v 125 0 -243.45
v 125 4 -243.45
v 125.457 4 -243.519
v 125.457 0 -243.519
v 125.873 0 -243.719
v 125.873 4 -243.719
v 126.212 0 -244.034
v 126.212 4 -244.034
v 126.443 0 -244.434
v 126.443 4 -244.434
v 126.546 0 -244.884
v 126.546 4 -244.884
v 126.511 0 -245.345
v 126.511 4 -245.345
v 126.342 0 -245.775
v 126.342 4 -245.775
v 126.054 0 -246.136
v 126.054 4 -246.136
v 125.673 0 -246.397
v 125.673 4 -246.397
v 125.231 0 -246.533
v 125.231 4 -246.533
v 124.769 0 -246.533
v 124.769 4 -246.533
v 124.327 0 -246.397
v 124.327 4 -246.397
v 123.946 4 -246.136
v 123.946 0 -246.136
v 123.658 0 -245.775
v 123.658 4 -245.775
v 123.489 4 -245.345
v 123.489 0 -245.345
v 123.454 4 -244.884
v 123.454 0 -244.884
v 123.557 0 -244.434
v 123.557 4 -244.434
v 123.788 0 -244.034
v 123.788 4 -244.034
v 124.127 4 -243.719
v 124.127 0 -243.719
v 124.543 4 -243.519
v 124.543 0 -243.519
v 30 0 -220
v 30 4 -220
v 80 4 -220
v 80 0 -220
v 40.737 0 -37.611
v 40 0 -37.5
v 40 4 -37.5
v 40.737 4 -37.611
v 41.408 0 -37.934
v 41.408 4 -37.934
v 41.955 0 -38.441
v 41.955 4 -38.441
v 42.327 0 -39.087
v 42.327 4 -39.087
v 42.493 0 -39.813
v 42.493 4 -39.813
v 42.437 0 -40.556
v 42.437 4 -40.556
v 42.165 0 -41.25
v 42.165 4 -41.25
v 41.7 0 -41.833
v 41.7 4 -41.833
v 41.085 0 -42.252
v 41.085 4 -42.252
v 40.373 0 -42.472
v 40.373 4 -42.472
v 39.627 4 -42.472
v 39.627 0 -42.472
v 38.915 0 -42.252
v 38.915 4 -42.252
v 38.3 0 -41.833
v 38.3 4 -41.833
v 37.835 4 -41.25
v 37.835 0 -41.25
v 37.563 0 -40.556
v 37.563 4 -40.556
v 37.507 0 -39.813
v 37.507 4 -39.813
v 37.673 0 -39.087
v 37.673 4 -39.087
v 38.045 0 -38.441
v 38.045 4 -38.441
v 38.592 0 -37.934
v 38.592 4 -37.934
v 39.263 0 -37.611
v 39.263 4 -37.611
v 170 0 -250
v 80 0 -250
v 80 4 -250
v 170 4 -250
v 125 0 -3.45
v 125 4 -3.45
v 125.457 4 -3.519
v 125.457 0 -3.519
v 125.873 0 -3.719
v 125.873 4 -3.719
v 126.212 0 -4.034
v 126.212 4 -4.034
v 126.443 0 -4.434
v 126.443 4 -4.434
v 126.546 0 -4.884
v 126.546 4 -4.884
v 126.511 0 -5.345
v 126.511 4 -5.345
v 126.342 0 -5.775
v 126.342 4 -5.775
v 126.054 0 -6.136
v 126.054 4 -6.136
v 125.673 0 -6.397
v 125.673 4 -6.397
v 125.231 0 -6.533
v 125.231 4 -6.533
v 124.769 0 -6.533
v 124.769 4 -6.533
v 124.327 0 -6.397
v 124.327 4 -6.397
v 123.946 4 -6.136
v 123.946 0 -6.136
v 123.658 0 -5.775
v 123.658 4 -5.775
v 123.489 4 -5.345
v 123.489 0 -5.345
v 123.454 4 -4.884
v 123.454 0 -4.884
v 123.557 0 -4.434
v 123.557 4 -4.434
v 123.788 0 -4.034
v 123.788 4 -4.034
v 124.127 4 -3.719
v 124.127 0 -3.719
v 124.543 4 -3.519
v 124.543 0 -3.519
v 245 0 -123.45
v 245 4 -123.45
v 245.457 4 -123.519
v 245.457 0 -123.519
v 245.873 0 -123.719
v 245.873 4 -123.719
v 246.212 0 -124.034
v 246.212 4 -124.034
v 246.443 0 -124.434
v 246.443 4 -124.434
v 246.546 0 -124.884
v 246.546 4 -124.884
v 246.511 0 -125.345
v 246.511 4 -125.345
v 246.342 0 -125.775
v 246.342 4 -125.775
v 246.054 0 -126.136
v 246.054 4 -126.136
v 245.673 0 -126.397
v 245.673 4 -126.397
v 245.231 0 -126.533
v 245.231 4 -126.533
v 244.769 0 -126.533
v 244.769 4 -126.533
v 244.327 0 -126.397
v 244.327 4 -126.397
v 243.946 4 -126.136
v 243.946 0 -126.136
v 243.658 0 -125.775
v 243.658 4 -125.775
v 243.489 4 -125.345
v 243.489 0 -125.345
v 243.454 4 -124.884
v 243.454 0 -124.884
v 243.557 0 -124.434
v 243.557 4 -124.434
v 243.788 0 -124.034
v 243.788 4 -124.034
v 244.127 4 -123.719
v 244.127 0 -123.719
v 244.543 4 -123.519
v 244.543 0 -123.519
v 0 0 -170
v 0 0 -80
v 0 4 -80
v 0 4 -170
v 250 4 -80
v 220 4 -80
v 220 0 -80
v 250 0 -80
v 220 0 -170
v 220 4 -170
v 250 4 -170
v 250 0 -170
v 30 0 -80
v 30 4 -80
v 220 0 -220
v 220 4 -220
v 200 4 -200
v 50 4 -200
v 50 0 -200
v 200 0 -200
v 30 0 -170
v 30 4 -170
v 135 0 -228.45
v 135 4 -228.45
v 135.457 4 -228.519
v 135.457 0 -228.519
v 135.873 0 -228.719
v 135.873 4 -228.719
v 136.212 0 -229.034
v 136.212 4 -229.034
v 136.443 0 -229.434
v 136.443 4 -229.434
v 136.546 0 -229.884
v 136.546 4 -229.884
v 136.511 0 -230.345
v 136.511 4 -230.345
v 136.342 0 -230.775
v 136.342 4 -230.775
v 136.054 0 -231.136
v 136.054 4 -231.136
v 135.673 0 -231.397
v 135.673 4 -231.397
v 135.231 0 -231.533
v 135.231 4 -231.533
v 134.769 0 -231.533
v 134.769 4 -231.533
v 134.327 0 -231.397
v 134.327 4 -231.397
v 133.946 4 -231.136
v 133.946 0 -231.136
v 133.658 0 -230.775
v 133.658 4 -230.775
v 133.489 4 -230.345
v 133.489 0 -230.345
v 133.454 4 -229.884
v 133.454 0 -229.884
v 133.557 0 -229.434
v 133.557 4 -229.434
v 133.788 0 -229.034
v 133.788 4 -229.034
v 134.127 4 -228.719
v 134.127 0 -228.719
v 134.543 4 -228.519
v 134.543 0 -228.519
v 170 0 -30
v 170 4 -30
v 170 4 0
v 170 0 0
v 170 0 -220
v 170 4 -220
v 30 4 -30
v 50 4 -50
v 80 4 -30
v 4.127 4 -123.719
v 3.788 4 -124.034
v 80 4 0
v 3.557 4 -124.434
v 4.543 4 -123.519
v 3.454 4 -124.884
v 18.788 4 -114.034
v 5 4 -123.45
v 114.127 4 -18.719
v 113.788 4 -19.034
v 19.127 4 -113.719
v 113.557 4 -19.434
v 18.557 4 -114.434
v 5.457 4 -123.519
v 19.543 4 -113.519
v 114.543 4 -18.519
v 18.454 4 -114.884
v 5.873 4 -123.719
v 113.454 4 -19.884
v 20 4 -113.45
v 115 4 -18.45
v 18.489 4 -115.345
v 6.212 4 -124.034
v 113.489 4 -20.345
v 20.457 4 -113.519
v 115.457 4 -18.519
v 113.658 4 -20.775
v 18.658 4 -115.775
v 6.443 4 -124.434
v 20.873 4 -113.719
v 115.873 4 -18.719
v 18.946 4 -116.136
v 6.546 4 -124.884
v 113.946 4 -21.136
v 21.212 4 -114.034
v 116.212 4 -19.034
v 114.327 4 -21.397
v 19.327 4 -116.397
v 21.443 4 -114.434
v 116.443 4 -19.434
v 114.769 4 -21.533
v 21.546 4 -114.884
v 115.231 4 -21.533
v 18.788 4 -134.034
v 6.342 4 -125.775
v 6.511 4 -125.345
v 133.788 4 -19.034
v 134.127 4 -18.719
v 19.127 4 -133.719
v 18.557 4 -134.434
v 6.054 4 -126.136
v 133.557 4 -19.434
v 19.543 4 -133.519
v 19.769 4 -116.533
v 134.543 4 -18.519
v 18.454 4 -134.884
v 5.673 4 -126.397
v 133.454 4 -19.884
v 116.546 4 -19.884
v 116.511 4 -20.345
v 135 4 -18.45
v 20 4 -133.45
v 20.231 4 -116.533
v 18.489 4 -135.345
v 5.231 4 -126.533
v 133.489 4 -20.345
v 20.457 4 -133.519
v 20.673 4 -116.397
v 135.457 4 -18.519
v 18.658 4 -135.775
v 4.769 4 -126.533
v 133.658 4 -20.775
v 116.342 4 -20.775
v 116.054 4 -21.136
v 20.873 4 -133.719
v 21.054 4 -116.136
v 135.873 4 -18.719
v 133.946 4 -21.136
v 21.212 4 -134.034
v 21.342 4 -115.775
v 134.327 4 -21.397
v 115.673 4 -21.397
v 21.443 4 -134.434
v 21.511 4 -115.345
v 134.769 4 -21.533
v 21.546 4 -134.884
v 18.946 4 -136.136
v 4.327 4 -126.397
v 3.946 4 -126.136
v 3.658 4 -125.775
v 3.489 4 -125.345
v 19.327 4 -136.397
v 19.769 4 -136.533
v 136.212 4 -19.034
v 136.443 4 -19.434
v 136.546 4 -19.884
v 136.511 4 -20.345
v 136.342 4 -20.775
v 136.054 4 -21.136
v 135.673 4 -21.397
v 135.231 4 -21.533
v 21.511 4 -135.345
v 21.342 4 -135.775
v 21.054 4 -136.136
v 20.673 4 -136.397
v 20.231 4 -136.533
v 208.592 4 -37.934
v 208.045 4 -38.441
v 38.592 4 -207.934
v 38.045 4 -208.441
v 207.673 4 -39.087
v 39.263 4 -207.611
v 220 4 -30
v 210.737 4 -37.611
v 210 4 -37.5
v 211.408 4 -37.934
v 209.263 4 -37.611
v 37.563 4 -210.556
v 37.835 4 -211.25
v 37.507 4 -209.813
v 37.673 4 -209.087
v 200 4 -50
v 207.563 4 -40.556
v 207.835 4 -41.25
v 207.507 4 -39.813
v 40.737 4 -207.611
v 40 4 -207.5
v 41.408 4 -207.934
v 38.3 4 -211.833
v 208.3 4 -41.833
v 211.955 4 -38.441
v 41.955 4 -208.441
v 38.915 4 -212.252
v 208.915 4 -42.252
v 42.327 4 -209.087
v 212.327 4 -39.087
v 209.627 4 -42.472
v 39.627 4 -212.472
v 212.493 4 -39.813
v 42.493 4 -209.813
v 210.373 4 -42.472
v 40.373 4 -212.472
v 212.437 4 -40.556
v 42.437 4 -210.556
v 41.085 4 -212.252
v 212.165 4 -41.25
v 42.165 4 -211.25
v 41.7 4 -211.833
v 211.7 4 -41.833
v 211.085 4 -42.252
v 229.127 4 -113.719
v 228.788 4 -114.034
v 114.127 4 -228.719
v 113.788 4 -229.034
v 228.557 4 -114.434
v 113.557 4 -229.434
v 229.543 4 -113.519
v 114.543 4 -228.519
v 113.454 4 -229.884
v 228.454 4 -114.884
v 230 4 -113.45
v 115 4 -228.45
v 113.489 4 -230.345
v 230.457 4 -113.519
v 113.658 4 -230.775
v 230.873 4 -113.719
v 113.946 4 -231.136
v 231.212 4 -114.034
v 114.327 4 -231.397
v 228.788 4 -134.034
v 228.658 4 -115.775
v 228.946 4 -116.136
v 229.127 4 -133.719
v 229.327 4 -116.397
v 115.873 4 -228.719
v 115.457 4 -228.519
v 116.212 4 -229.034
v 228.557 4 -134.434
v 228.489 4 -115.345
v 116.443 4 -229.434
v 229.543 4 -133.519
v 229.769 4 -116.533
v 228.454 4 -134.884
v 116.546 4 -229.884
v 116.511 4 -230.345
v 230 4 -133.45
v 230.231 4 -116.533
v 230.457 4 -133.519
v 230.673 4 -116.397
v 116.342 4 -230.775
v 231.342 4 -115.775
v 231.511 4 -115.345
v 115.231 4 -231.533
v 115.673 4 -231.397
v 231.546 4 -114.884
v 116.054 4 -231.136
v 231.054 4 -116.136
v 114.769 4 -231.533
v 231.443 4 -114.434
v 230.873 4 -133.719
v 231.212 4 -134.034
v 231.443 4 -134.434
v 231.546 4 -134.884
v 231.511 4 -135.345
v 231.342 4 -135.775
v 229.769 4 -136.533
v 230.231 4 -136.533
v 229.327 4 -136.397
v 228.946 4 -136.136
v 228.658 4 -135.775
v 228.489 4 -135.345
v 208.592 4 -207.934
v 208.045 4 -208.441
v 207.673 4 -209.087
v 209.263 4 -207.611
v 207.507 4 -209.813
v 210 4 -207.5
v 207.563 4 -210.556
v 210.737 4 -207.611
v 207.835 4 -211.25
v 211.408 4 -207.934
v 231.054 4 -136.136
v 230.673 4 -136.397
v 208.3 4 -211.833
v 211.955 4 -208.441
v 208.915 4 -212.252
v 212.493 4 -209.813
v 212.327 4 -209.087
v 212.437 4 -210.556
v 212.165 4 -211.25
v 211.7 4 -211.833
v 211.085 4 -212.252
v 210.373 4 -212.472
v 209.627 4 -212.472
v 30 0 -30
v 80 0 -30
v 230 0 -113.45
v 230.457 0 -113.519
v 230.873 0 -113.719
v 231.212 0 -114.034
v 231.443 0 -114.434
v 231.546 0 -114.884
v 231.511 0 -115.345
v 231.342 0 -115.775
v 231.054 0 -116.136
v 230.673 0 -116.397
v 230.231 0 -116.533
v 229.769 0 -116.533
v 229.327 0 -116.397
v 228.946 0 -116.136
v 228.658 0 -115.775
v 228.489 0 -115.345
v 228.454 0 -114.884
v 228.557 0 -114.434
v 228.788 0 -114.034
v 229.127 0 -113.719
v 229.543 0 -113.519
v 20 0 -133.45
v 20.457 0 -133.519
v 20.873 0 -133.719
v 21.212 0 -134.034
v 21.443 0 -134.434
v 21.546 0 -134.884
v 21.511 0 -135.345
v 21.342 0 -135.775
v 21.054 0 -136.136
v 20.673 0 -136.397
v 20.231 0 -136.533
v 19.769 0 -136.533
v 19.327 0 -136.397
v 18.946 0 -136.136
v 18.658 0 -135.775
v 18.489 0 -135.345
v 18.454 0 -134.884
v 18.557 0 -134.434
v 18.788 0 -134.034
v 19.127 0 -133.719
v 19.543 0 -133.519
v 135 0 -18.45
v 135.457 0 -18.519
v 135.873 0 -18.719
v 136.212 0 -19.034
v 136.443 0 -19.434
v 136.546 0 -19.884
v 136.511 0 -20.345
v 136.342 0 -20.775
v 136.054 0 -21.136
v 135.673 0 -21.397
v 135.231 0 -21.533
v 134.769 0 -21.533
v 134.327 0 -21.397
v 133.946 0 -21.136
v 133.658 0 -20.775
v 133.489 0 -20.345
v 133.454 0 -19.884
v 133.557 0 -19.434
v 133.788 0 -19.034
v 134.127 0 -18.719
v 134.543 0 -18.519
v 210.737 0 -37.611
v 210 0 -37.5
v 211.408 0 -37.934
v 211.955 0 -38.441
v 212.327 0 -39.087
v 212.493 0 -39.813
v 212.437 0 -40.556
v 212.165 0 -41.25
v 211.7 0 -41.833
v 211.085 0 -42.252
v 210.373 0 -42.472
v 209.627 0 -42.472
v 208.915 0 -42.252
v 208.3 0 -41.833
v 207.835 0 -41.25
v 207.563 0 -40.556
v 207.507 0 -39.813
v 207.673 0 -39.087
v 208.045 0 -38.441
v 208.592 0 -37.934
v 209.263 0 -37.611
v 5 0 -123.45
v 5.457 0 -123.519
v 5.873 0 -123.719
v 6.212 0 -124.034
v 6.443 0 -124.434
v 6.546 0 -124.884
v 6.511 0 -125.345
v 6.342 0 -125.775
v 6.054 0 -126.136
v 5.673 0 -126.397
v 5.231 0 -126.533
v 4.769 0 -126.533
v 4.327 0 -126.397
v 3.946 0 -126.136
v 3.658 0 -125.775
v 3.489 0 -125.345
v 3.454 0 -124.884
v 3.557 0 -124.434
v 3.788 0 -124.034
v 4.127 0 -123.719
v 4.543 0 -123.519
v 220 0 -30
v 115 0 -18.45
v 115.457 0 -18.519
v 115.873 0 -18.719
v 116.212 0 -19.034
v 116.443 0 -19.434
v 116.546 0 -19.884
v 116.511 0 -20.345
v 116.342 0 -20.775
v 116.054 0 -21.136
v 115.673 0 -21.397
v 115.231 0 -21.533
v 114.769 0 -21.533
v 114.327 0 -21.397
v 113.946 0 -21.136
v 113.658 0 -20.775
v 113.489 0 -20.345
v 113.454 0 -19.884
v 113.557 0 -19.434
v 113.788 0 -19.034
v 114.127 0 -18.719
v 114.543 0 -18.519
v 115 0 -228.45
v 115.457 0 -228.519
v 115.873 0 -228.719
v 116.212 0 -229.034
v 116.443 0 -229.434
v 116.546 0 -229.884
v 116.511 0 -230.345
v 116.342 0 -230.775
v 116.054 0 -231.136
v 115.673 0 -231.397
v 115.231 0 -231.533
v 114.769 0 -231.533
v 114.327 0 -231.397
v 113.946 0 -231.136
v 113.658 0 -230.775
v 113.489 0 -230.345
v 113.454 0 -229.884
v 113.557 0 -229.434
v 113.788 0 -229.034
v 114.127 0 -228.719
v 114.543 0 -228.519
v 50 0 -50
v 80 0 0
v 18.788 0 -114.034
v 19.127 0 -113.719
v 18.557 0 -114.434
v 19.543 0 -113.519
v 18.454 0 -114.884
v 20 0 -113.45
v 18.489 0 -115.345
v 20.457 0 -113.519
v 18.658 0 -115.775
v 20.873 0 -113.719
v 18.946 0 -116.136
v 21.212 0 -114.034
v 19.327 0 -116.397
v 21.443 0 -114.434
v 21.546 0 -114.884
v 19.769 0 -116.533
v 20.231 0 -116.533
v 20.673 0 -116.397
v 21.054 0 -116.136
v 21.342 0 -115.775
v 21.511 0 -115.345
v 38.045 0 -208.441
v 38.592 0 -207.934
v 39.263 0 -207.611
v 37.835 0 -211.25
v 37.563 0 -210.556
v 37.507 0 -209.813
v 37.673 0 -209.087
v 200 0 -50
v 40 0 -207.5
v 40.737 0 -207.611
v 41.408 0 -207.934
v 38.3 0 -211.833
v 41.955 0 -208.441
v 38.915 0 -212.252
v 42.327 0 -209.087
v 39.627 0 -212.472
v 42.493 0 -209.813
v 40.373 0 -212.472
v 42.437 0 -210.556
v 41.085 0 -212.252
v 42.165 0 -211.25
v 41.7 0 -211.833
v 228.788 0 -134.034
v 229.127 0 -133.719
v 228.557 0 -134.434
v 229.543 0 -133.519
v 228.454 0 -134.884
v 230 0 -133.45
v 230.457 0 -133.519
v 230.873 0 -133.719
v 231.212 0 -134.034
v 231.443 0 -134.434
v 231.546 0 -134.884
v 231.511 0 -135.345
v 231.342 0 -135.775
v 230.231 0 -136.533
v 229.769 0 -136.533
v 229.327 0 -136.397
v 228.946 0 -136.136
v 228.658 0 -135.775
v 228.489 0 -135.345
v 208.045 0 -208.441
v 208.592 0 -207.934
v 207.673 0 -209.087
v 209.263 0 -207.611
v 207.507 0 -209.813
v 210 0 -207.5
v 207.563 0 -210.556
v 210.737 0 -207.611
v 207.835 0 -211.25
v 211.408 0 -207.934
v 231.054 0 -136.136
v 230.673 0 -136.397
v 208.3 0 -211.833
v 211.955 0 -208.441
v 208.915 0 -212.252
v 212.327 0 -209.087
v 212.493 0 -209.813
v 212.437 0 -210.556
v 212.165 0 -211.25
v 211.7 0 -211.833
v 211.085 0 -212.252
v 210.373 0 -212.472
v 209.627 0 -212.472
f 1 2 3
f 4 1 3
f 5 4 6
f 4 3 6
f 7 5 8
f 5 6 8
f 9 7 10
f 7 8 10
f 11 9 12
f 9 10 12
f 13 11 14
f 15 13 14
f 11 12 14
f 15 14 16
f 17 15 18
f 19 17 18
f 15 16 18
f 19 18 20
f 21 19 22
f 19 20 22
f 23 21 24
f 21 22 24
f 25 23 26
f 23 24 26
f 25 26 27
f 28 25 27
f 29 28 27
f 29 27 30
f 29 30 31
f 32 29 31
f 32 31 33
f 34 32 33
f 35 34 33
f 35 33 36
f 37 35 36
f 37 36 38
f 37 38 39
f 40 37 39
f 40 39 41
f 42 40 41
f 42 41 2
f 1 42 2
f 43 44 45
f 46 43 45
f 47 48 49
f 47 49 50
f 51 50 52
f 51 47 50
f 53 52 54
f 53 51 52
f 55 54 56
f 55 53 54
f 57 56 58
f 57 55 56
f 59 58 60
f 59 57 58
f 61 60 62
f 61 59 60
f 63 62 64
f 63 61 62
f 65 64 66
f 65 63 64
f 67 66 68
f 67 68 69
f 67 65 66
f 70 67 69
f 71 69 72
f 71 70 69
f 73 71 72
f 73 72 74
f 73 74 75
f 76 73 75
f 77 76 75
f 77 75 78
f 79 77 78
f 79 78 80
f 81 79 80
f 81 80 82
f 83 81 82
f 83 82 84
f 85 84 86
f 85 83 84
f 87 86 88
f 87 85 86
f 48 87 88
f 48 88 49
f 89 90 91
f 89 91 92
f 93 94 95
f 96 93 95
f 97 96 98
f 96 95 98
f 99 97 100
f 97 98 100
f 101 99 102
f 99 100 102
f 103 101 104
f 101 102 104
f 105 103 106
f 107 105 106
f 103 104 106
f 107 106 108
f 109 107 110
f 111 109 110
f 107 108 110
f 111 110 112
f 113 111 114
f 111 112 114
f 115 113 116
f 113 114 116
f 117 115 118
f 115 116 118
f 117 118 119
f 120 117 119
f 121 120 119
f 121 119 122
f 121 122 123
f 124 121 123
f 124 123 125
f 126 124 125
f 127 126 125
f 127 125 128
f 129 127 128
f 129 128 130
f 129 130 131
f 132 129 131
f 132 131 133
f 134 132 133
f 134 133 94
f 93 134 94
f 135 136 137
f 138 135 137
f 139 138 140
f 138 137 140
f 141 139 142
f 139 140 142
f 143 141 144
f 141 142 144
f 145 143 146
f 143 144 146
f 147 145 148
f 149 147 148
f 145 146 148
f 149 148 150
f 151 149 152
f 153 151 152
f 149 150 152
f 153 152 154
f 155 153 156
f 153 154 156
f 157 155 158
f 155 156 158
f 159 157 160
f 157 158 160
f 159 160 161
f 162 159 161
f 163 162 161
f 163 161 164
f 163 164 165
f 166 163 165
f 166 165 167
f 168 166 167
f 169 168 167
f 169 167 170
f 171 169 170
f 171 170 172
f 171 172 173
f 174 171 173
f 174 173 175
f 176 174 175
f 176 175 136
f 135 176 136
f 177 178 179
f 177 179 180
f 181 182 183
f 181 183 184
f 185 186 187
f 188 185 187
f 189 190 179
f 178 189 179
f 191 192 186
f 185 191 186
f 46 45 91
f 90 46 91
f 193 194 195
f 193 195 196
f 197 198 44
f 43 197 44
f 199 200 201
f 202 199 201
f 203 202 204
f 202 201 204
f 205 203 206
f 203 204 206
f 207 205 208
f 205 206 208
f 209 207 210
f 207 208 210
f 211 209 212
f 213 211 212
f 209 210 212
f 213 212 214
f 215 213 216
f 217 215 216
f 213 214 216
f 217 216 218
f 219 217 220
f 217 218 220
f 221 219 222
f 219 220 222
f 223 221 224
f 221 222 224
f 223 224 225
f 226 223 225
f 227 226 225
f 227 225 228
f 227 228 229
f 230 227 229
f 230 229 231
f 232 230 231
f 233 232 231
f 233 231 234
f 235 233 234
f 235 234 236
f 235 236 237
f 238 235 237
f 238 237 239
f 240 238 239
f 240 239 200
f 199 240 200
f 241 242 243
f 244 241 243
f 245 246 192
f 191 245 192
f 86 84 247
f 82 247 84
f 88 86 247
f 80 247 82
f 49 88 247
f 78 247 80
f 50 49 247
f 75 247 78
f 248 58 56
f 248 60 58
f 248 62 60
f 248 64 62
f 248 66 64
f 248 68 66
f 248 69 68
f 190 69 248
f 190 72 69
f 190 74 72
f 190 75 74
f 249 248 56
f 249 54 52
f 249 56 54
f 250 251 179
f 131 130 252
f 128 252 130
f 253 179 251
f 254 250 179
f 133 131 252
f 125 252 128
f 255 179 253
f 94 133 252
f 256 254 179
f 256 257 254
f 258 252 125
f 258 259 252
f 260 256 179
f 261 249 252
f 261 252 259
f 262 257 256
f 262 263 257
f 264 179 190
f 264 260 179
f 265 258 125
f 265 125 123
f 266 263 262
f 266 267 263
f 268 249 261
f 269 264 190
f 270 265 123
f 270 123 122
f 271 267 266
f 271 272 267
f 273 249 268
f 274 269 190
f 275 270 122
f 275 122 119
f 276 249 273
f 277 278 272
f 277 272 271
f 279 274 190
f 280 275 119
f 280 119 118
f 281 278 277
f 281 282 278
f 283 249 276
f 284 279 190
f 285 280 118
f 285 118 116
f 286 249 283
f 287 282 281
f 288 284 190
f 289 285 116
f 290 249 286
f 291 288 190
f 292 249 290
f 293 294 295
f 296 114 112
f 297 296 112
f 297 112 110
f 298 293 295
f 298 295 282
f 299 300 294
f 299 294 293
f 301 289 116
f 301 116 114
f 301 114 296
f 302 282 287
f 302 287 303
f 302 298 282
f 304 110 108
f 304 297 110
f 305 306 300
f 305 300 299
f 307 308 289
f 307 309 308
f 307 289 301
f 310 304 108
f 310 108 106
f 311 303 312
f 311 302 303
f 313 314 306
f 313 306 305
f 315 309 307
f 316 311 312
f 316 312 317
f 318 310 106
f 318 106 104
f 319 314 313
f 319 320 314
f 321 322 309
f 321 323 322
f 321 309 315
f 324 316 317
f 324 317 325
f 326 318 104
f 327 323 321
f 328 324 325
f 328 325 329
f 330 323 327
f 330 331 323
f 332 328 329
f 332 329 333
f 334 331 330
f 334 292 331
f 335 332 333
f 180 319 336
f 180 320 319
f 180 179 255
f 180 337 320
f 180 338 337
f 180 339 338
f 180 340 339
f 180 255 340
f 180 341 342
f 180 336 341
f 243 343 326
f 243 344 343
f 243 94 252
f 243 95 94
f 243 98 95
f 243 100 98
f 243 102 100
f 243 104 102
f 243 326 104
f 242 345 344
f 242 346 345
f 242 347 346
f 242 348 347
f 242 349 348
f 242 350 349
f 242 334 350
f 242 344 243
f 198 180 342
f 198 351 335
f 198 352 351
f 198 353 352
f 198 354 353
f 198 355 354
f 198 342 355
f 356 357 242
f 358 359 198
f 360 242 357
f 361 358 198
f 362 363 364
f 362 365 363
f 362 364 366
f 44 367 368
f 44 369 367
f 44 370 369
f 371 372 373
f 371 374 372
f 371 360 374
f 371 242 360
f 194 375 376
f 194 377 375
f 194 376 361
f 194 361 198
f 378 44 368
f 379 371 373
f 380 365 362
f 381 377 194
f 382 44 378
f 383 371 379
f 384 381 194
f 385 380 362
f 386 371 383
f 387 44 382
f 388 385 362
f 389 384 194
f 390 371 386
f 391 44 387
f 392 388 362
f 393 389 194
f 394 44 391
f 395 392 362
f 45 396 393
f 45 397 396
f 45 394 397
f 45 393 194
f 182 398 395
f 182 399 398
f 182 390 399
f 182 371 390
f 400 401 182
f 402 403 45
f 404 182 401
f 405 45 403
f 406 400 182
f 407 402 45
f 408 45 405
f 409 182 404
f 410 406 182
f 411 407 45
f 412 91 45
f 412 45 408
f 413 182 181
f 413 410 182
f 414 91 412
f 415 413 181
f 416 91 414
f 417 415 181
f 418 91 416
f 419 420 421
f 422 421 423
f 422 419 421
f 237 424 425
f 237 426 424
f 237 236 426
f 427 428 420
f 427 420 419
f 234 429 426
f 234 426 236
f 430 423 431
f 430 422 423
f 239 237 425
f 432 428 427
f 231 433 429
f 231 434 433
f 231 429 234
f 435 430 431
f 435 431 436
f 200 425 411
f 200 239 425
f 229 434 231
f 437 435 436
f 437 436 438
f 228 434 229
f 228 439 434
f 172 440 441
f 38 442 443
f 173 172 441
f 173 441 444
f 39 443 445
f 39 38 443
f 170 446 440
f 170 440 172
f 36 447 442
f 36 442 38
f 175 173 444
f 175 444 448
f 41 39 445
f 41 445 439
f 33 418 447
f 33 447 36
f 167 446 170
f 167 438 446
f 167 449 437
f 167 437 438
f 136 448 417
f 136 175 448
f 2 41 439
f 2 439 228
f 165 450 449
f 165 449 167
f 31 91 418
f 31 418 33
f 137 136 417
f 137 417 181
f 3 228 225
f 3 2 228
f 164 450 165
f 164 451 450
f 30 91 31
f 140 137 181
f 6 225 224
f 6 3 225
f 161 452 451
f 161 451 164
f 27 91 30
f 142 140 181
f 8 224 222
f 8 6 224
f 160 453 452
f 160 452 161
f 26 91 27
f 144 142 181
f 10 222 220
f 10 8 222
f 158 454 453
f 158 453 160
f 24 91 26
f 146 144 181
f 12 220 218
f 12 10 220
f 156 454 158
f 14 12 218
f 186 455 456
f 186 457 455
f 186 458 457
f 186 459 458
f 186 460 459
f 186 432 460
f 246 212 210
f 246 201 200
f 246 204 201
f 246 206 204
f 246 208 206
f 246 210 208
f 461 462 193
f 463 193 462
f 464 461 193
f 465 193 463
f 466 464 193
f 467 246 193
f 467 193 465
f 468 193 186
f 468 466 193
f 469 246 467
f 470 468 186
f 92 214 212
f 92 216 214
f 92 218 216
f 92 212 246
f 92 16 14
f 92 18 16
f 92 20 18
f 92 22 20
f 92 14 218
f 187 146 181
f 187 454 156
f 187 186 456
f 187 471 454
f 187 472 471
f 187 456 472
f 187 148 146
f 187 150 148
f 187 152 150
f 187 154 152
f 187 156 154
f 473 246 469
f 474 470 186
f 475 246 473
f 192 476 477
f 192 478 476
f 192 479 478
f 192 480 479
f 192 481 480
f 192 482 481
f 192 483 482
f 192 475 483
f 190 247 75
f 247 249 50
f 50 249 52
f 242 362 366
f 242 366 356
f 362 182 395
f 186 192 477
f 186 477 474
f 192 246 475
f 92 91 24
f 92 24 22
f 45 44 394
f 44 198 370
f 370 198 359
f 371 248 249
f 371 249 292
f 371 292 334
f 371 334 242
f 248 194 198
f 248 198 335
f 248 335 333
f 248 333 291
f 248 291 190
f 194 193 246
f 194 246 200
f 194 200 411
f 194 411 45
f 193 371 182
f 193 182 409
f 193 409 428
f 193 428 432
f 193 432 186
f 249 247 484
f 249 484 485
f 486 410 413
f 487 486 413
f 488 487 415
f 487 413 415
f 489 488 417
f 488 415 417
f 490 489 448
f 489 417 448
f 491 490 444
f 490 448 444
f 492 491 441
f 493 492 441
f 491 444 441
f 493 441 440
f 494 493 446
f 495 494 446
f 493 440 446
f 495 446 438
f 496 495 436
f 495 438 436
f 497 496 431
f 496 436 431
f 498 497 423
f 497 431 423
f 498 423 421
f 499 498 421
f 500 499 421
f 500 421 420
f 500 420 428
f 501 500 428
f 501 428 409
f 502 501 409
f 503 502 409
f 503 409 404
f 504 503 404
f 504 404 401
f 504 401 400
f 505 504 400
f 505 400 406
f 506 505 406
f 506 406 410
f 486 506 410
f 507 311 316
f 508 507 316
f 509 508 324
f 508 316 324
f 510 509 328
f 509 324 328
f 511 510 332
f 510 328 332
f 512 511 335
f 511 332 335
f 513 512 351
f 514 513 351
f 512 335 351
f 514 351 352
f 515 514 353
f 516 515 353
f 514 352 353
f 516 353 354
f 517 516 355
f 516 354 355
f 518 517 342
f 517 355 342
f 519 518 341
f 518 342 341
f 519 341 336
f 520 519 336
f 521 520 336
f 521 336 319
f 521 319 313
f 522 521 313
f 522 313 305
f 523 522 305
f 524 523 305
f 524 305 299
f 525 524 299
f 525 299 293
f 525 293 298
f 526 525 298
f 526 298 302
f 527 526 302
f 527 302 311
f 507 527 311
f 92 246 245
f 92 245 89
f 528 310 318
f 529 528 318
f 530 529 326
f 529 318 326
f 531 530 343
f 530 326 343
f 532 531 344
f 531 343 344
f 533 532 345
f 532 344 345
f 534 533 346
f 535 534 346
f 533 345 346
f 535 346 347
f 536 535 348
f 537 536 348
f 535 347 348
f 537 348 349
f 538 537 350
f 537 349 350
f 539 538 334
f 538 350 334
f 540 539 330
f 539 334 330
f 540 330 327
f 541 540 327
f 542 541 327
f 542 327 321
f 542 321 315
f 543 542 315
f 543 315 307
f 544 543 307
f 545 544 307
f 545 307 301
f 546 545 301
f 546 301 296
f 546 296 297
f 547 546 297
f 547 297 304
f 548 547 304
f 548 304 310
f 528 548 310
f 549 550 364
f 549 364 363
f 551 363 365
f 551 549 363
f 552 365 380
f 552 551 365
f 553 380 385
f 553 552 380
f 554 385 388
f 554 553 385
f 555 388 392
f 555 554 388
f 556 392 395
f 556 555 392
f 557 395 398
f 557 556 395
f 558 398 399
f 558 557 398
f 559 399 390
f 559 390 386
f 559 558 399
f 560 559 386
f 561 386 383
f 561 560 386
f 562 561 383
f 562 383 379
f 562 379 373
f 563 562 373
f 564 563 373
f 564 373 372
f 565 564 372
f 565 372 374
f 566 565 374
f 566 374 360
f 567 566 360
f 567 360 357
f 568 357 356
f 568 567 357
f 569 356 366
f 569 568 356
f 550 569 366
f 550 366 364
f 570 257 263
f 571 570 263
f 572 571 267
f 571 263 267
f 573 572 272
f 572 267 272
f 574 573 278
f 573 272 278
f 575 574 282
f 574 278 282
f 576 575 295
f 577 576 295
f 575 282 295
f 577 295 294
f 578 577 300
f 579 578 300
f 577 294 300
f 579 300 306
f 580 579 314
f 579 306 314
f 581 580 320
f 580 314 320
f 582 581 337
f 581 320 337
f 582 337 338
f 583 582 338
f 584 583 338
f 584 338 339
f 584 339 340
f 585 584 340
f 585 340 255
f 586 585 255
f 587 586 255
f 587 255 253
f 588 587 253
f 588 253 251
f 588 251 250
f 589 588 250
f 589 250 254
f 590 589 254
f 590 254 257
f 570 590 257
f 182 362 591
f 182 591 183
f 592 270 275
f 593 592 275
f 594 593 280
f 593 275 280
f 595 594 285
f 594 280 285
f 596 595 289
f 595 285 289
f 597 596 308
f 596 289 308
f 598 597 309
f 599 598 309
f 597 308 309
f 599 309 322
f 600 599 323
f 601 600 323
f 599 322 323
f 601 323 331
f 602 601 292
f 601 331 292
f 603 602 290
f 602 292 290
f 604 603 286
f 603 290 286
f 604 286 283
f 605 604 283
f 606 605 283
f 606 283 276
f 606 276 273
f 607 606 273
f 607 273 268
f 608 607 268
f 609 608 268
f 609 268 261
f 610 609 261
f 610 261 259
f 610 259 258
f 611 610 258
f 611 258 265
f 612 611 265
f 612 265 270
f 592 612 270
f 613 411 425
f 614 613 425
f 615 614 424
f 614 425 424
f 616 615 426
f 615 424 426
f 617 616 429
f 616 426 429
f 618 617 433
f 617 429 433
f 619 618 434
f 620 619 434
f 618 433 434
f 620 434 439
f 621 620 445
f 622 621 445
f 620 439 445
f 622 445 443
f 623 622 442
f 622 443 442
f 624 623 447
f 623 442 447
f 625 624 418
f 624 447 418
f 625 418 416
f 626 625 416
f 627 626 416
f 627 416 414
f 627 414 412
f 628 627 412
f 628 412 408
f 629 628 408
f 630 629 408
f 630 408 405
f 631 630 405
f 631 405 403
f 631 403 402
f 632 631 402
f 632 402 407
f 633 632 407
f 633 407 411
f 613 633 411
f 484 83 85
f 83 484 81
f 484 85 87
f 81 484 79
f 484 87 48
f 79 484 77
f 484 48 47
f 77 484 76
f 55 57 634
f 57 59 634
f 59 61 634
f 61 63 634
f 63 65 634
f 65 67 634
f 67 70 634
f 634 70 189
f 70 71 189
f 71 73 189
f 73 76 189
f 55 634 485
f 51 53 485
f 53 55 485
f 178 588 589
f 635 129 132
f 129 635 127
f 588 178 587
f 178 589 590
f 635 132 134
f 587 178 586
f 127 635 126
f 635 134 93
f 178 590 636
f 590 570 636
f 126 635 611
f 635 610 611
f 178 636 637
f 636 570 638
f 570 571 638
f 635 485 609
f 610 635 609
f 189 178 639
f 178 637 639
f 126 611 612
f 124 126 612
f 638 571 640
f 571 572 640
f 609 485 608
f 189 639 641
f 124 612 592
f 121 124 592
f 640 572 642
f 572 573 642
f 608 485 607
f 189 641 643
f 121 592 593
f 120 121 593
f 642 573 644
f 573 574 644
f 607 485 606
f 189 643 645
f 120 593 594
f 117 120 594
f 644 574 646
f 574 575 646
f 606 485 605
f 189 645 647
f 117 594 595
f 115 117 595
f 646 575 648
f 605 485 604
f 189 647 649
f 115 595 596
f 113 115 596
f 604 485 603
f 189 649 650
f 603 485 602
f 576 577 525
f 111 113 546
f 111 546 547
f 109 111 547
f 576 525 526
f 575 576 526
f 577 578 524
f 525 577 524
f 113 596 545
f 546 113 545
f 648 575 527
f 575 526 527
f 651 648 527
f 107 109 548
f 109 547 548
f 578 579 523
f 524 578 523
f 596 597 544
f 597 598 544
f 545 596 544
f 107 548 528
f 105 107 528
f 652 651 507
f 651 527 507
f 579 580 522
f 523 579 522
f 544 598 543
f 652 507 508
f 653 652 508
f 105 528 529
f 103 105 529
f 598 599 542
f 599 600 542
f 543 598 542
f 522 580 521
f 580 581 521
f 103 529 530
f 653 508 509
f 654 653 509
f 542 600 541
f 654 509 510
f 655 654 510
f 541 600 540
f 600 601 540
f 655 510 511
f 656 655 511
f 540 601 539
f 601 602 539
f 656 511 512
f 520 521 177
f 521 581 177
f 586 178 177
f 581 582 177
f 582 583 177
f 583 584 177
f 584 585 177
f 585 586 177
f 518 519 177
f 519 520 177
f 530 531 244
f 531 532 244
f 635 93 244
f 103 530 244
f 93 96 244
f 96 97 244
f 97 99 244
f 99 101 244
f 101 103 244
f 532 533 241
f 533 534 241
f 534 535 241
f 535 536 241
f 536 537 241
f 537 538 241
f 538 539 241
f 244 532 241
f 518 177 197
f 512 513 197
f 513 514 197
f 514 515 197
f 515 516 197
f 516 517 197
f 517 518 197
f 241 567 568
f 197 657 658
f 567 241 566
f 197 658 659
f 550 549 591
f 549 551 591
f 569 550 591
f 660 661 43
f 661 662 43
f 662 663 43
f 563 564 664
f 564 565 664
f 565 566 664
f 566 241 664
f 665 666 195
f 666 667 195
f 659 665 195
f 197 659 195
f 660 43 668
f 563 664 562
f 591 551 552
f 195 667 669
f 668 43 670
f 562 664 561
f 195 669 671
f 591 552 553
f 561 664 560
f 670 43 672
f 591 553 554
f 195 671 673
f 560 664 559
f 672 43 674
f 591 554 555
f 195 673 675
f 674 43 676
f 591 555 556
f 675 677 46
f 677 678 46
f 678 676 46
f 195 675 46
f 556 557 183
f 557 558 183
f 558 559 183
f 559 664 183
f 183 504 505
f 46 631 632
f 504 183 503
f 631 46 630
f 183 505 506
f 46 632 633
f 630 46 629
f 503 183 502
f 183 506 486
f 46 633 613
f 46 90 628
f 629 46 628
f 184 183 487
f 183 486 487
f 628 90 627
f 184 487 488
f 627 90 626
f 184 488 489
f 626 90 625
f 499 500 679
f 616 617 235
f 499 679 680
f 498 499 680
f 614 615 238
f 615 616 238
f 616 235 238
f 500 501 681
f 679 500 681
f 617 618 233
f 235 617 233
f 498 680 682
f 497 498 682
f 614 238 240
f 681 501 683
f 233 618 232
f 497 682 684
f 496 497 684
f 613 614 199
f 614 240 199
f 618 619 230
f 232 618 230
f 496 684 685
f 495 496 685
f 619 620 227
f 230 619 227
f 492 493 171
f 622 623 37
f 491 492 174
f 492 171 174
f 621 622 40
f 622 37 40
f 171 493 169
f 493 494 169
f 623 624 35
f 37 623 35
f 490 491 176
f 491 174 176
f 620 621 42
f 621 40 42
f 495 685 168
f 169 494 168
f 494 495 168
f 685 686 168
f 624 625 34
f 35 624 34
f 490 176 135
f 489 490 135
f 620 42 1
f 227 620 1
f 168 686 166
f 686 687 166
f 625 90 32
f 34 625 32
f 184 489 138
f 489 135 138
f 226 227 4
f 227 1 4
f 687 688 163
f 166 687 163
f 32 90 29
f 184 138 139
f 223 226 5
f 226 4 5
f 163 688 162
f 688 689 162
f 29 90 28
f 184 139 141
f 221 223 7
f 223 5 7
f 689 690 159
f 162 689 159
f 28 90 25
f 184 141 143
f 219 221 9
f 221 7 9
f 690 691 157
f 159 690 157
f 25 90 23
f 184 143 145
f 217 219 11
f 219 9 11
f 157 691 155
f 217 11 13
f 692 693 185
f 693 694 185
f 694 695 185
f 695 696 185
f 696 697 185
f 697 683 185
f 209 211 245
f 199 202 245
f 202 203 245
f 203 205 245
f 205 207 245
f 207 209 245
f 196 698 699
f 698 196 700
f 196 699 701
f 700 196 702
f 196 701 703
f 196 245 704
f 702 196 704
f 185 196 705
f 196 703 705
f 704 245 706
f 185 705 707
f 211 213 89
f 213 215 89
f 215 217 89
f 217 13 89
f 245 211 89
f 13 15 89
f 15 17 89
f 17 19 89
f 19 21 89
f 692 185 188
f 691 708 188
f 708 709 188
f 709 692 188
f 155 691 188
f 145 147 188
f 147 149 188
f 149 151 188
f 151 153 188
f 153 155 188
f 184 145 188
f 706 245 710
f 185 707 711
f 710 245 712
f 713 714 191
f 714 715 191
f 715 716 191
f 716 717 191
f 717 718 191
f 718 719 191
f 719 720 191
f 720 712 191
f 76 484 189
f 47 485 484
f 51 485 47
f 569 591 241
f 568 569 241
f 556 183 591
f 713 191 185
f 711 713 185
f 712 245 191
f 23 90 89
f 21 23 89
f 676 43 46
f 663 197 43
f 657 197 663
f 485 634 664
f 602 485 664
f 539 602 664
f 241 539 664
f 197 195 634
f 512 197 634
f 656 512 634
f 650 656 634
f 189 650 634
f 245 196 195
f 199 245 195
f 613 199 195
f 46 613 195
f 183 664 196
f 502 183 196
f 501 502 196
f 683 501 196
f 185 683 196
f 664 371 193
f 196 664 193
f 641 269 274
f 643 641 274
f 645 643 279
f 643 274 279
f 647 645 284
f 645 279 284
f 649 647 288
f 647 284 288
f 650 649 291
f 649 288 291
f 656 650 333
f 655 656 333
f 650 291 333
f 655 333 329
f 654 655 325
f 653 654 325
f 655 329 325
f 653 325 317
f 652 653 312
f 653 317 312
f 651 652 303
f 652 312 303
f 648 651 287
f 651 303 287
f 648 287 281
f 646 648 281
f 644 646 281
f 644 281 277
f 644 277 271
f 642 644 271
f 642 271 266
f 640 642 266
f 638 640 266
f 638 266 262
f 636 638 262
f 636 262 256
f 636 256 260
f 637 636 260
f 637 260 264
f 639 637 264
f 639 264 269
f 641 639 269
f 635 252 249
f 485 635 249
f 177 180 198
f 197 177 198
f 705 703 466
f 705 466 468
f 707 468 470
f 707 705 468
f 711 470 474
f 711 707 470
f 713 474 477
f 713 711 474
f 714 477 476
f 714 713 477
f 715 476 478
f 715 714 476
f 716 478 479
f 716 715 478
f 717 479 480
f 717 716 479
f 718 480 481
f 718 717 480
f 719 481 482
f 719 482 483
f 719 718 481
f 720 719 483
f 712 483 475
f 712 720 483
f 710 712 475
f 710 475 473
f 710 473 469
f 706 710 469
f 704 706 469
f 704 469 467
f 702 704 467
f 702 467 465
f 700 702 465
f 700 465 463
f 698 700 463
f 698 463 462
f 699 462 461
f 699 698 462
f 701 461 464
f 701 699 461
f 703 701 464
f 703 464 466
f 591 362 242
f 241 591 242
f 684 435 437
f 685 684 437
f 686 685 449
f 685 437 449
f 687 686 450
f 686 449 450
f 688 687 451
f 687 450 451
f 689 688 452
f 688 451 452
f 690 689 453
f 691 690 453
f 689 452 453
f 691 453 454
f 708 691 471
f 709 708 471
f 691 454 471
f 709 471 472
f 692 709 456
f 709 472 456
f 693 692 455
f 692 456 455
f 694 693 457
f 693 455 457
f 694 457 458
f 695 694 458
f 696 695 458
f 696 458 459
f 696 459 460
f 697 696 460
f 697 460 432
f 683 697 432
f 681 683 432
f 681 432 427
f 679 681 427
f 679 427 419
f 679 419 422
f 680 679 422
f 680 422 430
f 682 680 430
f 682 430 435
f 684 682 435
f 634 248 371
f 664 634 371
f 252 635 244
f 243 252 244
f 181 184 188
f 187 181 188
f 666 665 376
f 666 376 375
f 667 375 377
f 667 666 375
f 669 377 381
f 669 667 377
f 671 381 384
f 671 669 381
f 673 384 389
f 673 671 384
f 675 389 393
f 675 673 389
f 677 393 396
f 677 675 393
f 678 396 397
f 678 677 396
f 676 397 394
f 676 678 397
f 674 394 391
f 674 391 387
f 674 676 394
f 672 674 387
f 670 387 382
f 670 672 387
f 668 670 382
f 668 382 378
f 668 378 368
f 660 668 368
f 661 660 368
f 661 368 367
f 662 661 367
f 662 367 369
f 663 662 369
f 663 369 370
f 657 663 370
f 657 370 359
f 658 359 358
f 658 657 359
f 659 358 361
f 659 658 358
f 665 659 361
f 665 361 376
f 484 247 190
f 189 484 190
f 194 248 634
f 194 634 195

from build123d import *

# Parameters (mm, degrees)
CROQUIS1_W              = 250
CROQUIS1_H              = 250
CROQUIS1_R              = 2.5
SALIENTE_EXTRUIR1_DEPTH = 4
CORTAR_EXTRUIR1_DEPTH   = 4
CROQUIS3_W              = 150
CROQUIS3_H              = 150
CROQUIS3_W_2            = 100
CROQUIS3_H_2            = 100
SALIENTE_EXTRUIR2_DEPTH = 4
CROQUIS4_R              = 1.55
CORTAR_EXTRUIR2_DEPTH   = 10
CROQUIS5_W              = 150
CROQUIS5_H              = 150
CROQUIS5_W_2            = 100
CROQUIS5_H_2            = 100
CORTAR_EXTRUIR3_DEPTH   = 10
CROQUIS6_W              = 30
CROQUIS6_H              = 50
CROQUIS6_W_2            = 50
CROQUIS6_H_2            = 30
CORTAR_EXTRUIR4_DEPTH   = 10
CROQUIS8_R              = 1.55
CORTAR_EXTRUIR5_DEPTH   = 10


with BuildPart() as part:
    # Croquis1 → Saliente-Extruir1 (new body)
    with BuildSketch(Plane(origin=(0, 0, 0), x_dir=(1, 0, 0), z_dir=(0, 1, 0))):
        with Locations((125, 125)):
            Rectangle(CROQUIS1_W, CROQUIS1_H)
        with Locations(Location((40, 210, 0), (0, 0, 270))):
            Circle(CROQUIS1_R, mode=Mode.SUBTRACT)
        with Locations(Location((210, 210, 0), (0, 0, 270))):
            Circle(CROQUIS1_R, mode=Mode.SUBTRACT)
        with Locations(Location((210, 40, 0), (0, 0, 270))):
            Circle(CROQUIS1_R, mode=Mode.SUBTRACT)
        with Locations(Location((40, 40, 0), (0, 0, 270))):
            Circle(CROQUIS1_R, mode=Mode.SUBTRACT)
    extrude(amount=SALIENTE_EXTRUIR1_DEPTH)

    # Croquis2 → Cortar-Extruir1 (cut)
    with BuildSketch(Plane(origin=(0, 4, 0), x_dir=(1, 0, 0), z_dir=(0, 1, 0))):
        Polygon((50, 50), (200, 50), (200, 200), (50, 200), (50, 150.09044268), align=None)
    extrude(amount=-CORTAR_EXTRUIR1_DEPTH, mode=Mode.SUBTRACT)

    # Croquis3 → Saliente-Extruir2 (add)
    with BuildSketch(Plane(origin=(0, 4, 0), x_dir=(1, 0, 0), z_dir=(0, 1, 0))):
        with Locations((125, 125)):
            Rectangle(CROQUIS3_W, CROQUIS3_H)
        with Locations((125, 125)):
            Rectangle(CROQUIS3_W_2, CROQUIS3_H_2, mode=Mode.SUBTRACT)
    extrude(amount=-SALIENTE_EXTRUIR2_DEPTH)

    # Croquis4 → Cortar-Extruir2 (cut)
    with BuildSketch(Plane(origin=(0, 4, 0), x_dir=(1, 0, 0), z_dir=(0, 1, 0))):
        with Locations(Location((115, 20, 0), (0, 0, 270))):
            Circle(CROQUIS4_R)
        with Locations(Location((135, 20, 0), (0, 0, 270))):
            Circle(CROQUIS4_R)
        with Locations(Location((125, 5, 0), (0, 0, 270))):
            Circle(CROQUIS4_R)
    extrude(amount=-CORTAR_EXTRUIR2_DEPTH, mode=Mode.SUBTRACT)

    # Croquis5 → Cortar-Extruir3 (cut)
    with BuildSketch(Plane(origin=(0, 4, 0), x_dir=(1, 0, 0), z_dir=(0, 1, 0))):
        with Locations((125, 125)):
            Rectangle(CROQUIS5_W, CROQUIS5_H)
        with Locations((125, 125)):
            Rectangle(CROQUIS5_W_2, CROQUIS5_H_2, mode=Mode.SUBTRACT)
    extrude(amount=-CORTAR_EXTRUIR3_DEPTH, mode=Mode.SUBTRACT)

    # Croquis6 → Cortar-Extruir4 (cut)
    with BuildSketch(Plane(origin=(0, 4, 0), x_dir=(1, 0, 0), z_dir=(0, 1, 0))):
        Polygon((170, 0), (250, 0), (250, 30), (220, 30), (170, 30), align=None)
        with Locations((235, 55)):
            Rectangle(CROQUIS6_W, CROQUIS6_H)
        Polygon((0, 80), (0, 0), (30, 0), (30, 30), (30, 80), align=None)
        with Locations((55, 15)):
            Rectangle(CROQUIS6_W_2, CROQUIS6_H_2)
        Polygon((80, 250), (0, 250), (0, 220), (30, 220), (80, 220), align=None)
        with Locations((15, 195)):
            Rectangle(CROQUIS6_W, CROQUIS6_H)
        Polygon((250, 170), (250, 250), (220, 250), (220, 220), (220, 170), align=None)
        with Locations((195, 235)):
            Rectangle(CROQUIS6_W_2, CROQUIS6_H_2)
    extrude(amount=-CORTAR_EXTRUIR4_DEPTH, mode=Mode.SUBTRACT)

    # Croquis8 → Cortar-Extruir5 (cut)
    with BuildSketch(Plane(origin=(0, 4, 0), x_dir=(1, 0, 0), z_dir=(0, 1, 0))):
        with Locations(Location((125, 5, 0), (0, 0, 270))):
            Circle(CROQUIS8_R)
        with Locations(Location((135, 20, 0), (0, 0, 270))):
            Circle(CROQUIS8_R)
        with Locations(Location((115, 20, 0), (0, 0, 270))):
            Circle(CROQUIS8_R)
        with Locations(Location((20, 135, 0), (0, 0, 270))):
            Circle(CROQUIS8_R)
        with Locations(Location((5, 125, 0), (0, 0, 270))):
            Circle(CROQUIS8_R)
        with Locations(Location((20, 115, 0), (0, 0, 270))):
            Circle(CROQUIS8_R)
        with Locations(Location((135, 230, 0), (0, 0, 270))):
            Circle(CROQUIS8_R)
        with Locations(Location((125, 245, 0), (0, 0, 270))):
            Circle(CROQUIS8_R)
        with Locations(Location((115, 230, 0), (0, 0, 270))):
            Circle(CROQUIS8_R)
        with Locations(Location((230, 115, 0), (0, 0, 270))):
            Circle(CROQUIS8_R)
        with Locations(Location((245, 125, 0), (0, 0, 270))):
            Circle(CROQUIS8_R)
        with Locations(Location((230, 135, 0), (0, 0, 270))):
            Circle(CROQUIS8_R)
    extrude(amount=-CORTAR_EXTRUIR5_DEPTH, mode=Mode.SUBTRACT)


solid = part.part
